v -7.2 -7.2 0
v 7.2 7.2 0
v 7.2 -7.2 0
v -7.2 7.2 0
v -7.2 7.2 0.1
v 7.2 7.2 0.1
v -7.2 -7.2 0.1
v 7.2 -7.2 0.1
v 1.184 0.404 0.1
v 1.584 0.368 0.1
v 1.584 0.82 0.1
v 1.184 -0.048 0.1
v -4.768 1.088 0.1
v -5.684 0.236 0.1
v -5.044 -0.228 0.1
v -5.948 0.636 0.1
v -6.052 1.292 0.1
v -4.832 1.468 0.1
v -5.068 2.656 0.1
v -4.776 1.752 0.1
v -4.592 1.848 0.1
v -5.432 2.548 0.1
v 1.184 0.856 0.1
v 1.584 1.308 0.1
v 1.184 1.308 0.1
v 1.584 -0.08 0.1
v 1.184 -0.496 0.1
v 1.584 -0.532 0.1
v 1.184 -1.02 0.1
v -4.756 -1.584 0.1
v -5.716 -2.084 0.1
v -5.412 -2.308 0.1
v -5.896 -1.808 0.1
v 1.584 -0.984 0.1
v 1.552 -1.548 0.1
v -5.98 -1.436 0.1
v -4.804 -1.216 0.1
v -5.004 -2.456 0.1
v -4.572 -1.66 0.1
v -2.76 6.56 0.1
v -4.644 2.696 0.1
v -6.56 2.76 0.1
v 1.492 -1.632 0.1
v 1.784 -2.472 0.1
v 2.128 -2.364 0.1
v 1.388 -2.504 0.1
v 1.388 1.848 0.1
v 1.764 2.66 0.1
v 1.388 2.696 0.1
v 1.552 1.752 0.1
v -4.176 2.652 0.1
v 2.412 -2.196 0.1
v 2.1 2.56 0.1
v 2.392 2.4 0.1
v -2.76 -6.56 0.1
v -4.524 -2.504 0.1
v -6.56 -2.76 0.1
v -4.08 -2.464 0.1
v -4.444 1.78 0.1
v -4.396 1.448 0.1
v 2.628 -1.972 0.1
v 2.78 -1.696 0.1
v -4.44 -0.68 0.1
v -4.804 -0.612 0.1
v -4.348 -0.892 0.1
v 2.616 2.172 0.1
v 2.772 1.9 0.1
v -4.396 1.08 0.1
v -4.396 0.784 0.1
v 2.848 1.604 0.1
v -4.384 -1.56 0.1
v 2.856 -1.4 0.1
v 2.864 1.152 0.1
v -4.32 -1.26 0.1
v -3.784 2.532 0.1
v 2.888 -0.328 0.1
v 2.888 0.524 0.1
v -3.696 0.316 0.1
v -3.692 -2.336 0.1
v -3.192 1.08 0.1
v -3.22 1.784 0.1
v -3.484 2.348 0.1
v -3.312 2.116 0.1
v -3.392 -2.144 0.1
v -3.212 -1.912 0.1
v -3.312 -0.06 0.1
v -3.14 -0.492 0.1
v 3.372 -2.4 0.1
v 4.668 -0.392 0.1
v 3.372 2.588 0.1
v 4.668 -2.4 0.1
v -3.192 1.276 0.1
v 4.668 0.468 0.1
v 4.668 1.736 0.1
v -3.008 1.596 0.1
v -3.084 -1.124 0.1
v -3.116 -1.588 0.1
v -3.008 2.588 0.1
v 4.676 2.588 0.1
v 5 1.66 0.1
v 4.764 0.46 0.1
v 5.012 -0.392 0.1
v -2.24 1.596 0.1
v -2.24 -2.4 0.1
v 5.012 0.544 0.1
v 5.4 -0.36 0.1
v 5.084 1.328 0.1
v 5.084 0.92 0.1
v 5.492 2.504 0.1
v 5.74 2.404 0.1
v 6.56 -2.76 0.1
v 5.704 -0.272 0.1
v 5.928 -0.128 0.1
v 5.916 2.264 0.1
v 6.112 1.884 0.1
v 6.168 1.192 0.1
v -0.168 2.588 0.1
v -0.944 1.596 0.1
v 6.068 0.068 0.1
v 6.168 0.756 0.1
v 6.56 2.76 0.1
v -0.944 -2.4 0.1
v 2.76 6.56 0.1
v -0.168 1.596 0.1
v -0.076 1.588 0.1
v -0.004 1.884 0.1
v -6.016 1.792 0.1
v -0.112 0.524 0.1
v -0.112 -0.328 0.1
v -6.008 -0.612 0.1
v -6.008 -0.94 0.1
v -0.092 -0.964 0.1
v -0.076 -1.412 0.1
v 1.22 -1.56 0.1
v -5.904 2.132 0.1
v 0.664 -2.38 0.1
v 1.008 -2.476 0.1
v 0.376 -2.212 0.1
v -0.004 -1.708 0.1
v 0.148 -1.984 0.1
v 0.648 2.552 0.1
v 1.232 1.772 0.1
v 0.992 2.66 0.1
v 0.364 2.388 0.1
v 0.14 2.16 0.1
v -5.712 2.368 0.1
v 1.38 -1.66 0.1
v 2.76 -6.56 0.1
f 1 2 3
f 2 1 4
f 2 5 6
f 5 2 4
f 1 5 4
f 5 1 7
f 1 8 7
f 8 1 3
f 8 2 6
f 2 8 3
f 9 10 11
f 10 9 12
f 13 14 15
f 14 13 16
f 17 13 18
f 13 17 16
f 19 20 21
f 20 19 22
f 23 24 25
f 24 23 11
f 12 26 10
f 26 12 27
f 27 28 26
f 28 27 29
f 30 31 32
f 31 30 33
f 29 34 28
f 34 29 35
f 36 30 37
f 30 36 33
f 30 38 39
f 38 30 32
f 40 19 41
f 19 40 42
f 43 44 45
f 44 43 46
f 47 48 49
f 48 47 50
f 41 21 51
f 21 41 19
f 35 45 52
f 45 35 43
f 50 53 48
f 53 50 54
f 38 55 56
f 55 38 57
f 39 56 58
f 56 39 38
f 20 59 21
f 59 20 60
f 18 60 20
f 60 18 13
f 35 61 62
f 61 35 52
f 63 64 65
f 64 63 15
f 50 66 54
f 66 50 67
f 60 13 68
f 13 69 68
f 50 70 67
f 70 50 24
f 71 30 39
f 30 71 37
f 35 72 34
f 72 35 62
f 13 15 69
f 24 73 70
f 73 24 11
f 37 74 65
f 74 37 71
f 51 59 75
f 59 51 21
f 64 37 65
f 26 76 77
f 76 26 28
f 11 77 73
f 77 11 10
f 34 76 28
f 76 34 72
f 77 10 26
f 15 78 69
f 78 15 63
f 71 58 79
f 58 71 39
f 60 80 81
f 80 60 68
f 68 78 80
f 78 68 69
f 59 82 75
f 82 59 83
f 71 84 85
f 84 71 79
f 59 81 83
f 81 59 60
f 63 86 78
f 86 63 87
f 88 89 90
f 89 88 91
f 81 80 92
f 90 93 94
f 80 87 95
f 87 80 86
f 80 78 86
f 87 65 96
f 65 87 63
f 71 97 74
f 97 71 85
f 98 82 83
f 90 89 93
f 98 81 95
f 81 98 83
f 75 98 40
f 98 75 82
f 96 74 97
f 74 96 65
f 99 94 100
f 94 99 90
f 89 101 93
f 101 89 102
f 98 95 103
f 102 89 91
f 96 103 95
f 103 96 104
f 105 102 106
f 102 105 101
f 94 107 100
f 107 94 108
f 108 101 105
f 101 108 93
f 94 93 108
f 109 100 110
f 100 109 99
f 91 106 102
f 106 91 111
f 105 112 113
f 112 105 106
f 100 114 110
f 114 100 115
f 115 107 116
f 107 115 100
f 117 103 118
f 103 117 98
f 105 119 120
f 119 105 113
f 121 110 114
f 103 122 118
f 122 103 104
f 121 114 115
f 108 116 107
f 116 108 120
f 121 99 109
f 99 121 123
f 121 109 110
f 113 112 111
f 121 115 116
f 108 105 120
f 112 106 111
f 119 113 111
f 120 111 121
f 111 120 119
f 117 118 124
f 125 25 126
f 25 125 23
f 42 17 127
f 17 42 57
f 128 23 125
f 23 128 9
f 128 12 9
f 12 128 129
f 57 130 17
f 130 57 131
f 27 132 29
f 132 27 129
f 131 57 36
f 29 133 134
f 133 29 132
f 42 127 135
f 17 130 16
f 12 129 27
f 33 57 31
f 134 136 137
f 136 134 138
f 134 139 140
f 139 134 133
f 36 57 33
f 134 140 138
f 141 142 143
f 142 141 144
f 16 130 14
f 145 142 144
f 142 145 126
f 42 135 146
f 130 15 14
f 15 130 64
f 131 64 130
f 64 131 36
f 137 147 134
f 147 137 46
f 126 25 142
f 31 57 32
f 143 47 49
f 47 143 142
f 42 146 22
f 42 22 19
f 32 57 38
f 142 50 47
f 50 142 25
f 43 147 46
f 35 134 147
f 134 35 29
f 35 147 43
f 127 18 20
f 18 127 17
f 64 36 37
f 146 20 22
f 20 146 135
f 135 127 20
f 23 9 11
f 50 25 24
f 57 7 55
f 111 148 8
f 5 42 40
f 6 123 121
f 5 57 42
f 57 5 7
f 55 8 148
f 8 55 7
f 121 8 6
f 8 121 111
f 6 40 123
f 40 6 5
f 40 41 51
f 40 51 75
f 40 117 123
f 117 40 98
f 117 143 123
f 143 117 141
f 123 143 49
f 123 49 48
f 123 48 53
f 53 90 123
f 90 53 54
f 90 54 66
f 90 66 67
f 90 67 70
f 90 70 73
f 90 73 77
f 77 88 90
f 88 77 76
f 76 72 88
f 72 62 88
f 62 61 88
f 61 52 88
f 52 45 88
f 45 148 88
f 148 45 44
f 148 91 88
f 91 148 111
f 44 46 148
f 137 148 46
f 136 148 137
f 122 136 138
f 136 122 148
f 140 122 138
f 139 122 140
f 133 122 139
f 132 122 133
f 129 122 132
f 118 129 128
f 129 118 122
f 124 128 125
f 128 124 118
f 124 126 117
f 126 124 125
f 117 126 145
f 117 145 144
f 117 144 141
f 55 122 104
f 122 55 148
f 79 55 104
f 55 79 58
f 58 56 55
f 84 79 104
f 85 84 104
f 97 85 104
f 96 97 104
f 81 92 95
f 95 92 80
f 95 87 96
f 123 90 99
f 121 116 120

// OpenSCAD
// file: ../p/box5-12.scad
use <../lib.scad>
function ldraw_lib__box5_12() = [
// 0 Box with 5 Faces without Any Edges
// 0 Name: box5-12.dat
// 0 Author: Chris Dee [cwdee]
// 0 !LDRAW_ORG Primitive UPDATE 2009-02
// 0 !LICENSE Licensed under CC BY 4.0 : see CAreadme.txt
// 
// 0 BFC CERTIFY CCW
  [0,"BFC","CERTIFY"],
  [0,"BFC","CCW"],
// 
// 0 !HISTORY 2009-09-03 [PTadmin] Official Update 2009-02
// 
// 
// 4 16 1 1 1 1 1 -1 -1 1 -1 -1 1 1
  [4,16,1,1,1,1,1,-1,-1,1,-1,-1,1,1],
// 4 16 -1 0 1 1 0 1 1 1 1 -1 1 1
  [4,16,-1,0,1,1,0,1,1,1,1,-1,1,1],
// 4 16 -1 0 -1 -1 0 1 -1 1 1 -1 1 -1
  [4,16,-1,0,-1,-1,0,1,-1,1,1,-1,1,-1],
// 4 16 1 0 -1 -1 0 -1 -1 1 -1 1 1 -1
  [4,16,1,0,-1,-1,0,-1,-1,1,-1,1,1,-1],
// 4 16 1 0 1 1 0 -1 1 1 -1 1 1 1
  [4,16,1,0,1,1,0,-1,1,1,-1,1,1,1],
// 0
];
module ldraw_lib__box5_12(step=0, col=false, unit=2/5, alt=false, line=0.2, solid=!$preview)
    makepoly(ldraw_lib__box5_12(), step=step, col=col, unit=unit, alt=alt, line=line, solid=solid);
ldraw_lib__box5_12(line=0.2);
// main file
use <../lib.scad>
use <../p/box5-12.scad>
function ldraw_lib__4222889c() = [
// 0 Sticker  1.8 x  1.8 with Black "STOP" in Black Octagon
// 0 Name: 4222889c.dat
// 0 Author: Gerald Lasser [GeraldLasser]
// 0 !LDRAW_ORG Part UPDATE 2024-04
// 0 !LICENSE Licensed under CC BY 4.0 : see CAreadme.txt
// 
// 0 BFC CERTIFY CCW
  [0,"BFC","CERTIFY"],
  [0,"BFC","CCW"],
// 
// 0 !KEYWORDS Bricklink 4855stk01, Set 4855
// 
// 0 !HISTORY 2024-05-28 [OrionP] Official Update 2024-04
// 
// 
// 1 16 0 -.25 0 18 0 0 0 .25 0 0 0 18 box5-12.dat
  [1,16,0,-.25,0,18,0,0,0,.25,0,0,0,18, ldraw_lib__box5_12()],
// 
// 0 // Font: Impact
// 4 16 2.96 -.25 1.01 2.96 -.25 -.12 3.96 -.25 .92 3.96 -.25 2.05
  [4,16,2.96,-.25,1.01,2.96,-.25,-.12,3.96,-.25,.92,3.96,-.25,2.05],
// 4 0 -14.21 -.25 .59 -12.61 -.25 -.57 -11.92 -.25 2.72 -14.87 -.25 1.59
  [4,0,-14.21,-.25,.59,-12.61,-.25,-.57,-11.92,-.25,2.72,-14.87,-.25,1.59],
// 4 0 -15.13 -.25 3.23 -14.87 -.25 1.59 -11.92 -.25 2.72 -12.08 -.25 3.67
  [4,0,-15.13,-.25,3.23,-14.87,-.25,1.59,-11.92,-.25,2.72,-12.08,-.25,3.67],
// 4 0 -12.67 -.25 6.64 -13.58 -.25 6.37 -11.94 -.25 4.38 -11.48 -.25 4.62
  [4,0,-12.67,-.25,6.64,-13.58,-.25,6.37,-11.94,-.25,4.38,-11.48,-.25,4.62],
// 4 16 2.96 -.25 2.14 3.96 -.25 2.05 3.96 -.25 3.27 2.96 -.25 3.27
  [4,16,2.96,-.25,2.14,3.96,-.25,2.05,3.96,-.25,3.27,2.96,-.25,3.27],
// 4 16 3.96 -.25 -.2 3.96 -.25 .92 2.96 -.25 -.12 2.96 -.25 -1.24
  [4,16,3.96,-.25,-.2,3.96,-.25,.92,2.96,-.25,-.12,2.96,-.25,-1.24],
// 4 16 2.96 -.25 -1.24 2.96 -.25 -2.55 3.96 -.25 -1.33 3.96 -.25 -.2
  [4,16,2.96,-.25,-1.24,2.96,-.25,-2.55,3.96,-.25,-1.33,3.96,-.25,-.2],
// 4 0 -14.29 -.25 -5.21 -13.53 -.25 -5.77 -11.89 -.25 -3.96 -14.74 -.25 -4.52
  [4,0,-14.29,-.25,-5.21,-13.53,-.25,-5.77,-11.89,-.25,-3.96,-14.74,-.25,-4.52],
// 4 16 2.96 -.25 -2.55 3.88 -.25 -3.87 3.96 -.25 -2.46 3.96 -.25 -1.33
  [4,16,2.96,-.25,-2.55,3.88,-.25,-3.87,3.96,-.25,-2.46,3.96,-.25,-1.33],
// 4 0 -11.89 -.25 -3.96 -12.01 -.25 -3.04 -14.95 -.25 -3.59 -14.74 -.25 -4.52
  [4,0,-11.89,-.25,-3.96,-12.01,-.25,-3.04,-14.95,-.25,-3.59,-14.74,-.25,-4.52],
// 4 0 -11.89 -.25 -3.96 -13.53 -.25 -5.77 -12.51 -.25 -6.14 -11.43 -.25 -4.15
  [4,0,-11.89,-.25,-3.96,-13.53,-.25,-5.77,-12.51,-.25,-6.14,-11.43,-.25,-4.15],
// 4 16 -16.4 -.25 6.9 -12.67 -.25 6.64 -11.61 -.25 6.74 -6.9 -.25 16.4
  [4,16,-16.4,-.25,6.9,-12.67,-.25,6.64,-11.61,-.25,6.74,-6.9,-.25,16.4],
// 4 0 3.73 -.25 -4.08 3.47 -.25 -6.26 4.46 -.25 -6.18 5.32 -.25 -5.91
  [4,0,3.73,-.25,-4.08,3.47,-.25,-6.26,4.46,-.25,-6.18,5.32,-.25,-5.91],
// 4 0 4.41 -.25 6.65 3.47 -.25 6.74 3.47 -.25 4.62 3.88 -.25 4.38
  [4,0,4.41,-.25,6.65,3.47,-.25,6.74,3.47,-.25,4.62,3.88,-.25,4.38],
// 4 0 -11.61 -.25 6.74 -12.67 -.25 6.64 -11.48 -.25 4.62 -10.44 -.25 6.63
  [4,0,-11.61,-.25,6.74,-12.67,-.25,6.64,-11.48,-.25,4.62,-10.44,-.25,6.63],
// 4 0 3.88 -.25 -3.87 3.73 -.25 -4.08 5.32 -.25 -5.91 6.03 -.25 -5.49
  [4,0,3.88,-.25,-3.87,3.73,-.25,-4.08,5.32,-.25,-5.91,6.03,-.25,-5.49],
// 4 0 5.25 -.25 6.4 4.41 -.25 6.65 3.88 -.25 4.38 5.98 -.25 6
  [4,0,5.25,-.25,6.4,4.41,-.25,6.65,3.88,-.25,4.38,5.98,-.25,6],
// 4 16 -11.31 -.25 -6.26 -12.51 -.25 -6.14 -16.4 -.25 -6.9 -6.9 -.25 -16.4
  [4,16,-11.31,-.25,-6.26,-12.51,-.25,-6.14,-16.4,-.25,-6.9,-6.9,-.25,-16.4],
// 4 0 -11.43 -.25 -4.15 -12.51 -.25 -6.14 -11.31 -.25 -6.26 -10.2 -.25 -6.16
  [4,0,-11.43,-.25,-4.15,-12.51,-.25,-6.14,-11.31,-.25,-6.26,-10.2,-.25,-6.16],
// 4 16 -11.11 -.25 4.45 -11.48 -.25 4.62 -11.94 -.25 4.38 -10.99 -.25 3.62
  [4,16,-11.11,-.25,4.45,-11.48,-.25,4.62,-11.94,-.25,4.38,-10.99,-.25,3.62],
// 4 16 -12.08 -.25 3.67 -11.92 -.25 2.72 -10.99 -.25 3.62 -11.94 -.25 4.38
  [4,16,-12.08,-.25,3.67,-11.92,-.25,2.72,-10.99,-.25,3.62,-11.94,-.25,4.38],
// 4 0 3.88 -.25 -3.87 6.03 -.25 -5.49 6.57 -.25 -4.93 6.95 -.25 -4.24
  [4,0,3.88,-.25,-3.87,6.03,-.25,-5.49,6.57,-.25,-4.93,6.95,-.25,-4.24],
// 4 16 -11.1 -.25 -1.7 -12.61 -.25 -.57 -12.01 -.25 -1.53 -10.87 -.25 -2.23
  [4,16,-11.1,-.25,-1.7,-12.61,-.25,-.57,-12.01,-.25,-1.53,-10.87,-.25,-2.23],
// 4 0 6.54 -.25 5.43 5.98 -.25 6 3.88 -.25 4.38 6.93 -.25 4.75
  [4,0,6.54,-.25,5.43,5.98,-.25,6,3.88,-.25,4.38,6.93,-.25,4.75],
// 3 16 -10.99 -.25 3.62 -11.92 -.25 2.72 -10.99 -.25 2.7
  [3,16,-10.99,-.25,3.62,-11.92,-.25,2.72,-10.99,-.25,2.7],
// 3 16 -11.92 -.25 2.72 -10.99 -.25 1.96 -10.99 -.25 2.7
  [3,16,-11.92,-.25,2.72,-10.99,-.25,1.96,-10.99,-.25,2.7],
// 4 0 7.12 -.25 4.01 6.93 -.25 4.75 3.88 -.25 4.38 3.96 -.25 3.27
  [4,0,7.12,-.25,4.01,6.93,-.25,4.75,3.88,-.25,4.38,3.96,-.25,3.27],
// 4 16 -10.96 -.25 -3.9 -12.01 -.25 -3.04 -11.89 -.25 -3.96 -11.43 -.25 -4.15
  [4,16,-10.96,-.25,-3.9,-12.01,-.25,-3.04,-11.89,-.25,-3.96,-11.43,-.25,-4.15],
// 4 0 3.88 -.25 -3.87 6.95 -.25 -4.24 7.14 -.25 -3.5 3.96 -.25 -2.46
  [4,0,3.88,-.25,-3.87,6.95,-.25,-4.24,7.14,-.25,-3.5,3.96,-.25,-2.46],
// 3 0 -11.92 -.25 2.72 -12.61 -.25 -.57 -10.99 -.25 1.96
  [3,0,-11.92,-.25,2.72,-12.61,-.25,-.57,-10.99,-.25,1.96],
// 4 0 3.96 -.25 3.27 3.96 -.25 2.05 7.16 -.25 2.88 7.12 -.25 4.01
  [4,0,3.96,-.25,3.27,3.96,-.25,2.05,7.16,-.25,2.88,7.12,-.25,4.01],
// 4 16 -10.8 -.25 -3.15 -10.87 -.25 -2.23 -12.01 -.25 -3.04 -10.96 -.25 -3.9
  [4,16,-10.8,-.25,-3.15,-10.87,-.25,-2.23,-12.01,-.25,-3.04,-10.96,-.25,-3.9],
// 4 0 -10.44 -.25 6.63 -11.48 -.25 4.62 -11.11 -.25 4.45 -9.46 -.25 6.33
  [4,0,-10.44,-.25,6.63,-11.48,-.25,4.62,-11.11,-.25,4.45,-9.46,-.25,6.33],
// 3 16 -12.01 -.25 -1.53 -12.01 -.25 -3.04 -10.87 -.25 -2.23
  [3,16,-12.01,-.25,-1.53,-12.01,-.25,-3.04,-10.87,-.25,-2.23],
// 4 0 3.96 -.25 -.2 3.96 -.25 -1.33 7.22 -.25 -.82 7.22 -.25 1.31
  [4,0,3.96,-.25,-.2,3.96,-.25,-1.33,7.22,-.25,-.82,7.22,-.25,1.31],
// 4 0 7.22 -.25 1.31 7.16 -.25 2.88 3.96 -.25 2.05 3.96 -.25 .92
  [4,0,7.22,-.25,1.31,7.16,-.25,2.88,3.96,-.25,2.05,3.96,-.25,.92],
// 4 0 7.22 -.25 -.82 3.96 -.25 -1.33 3.96 -.25 -2.46 7.14 -.25 -3.5
  [4,0,7.22,-.25,-.82,3.96,-.25,-1.33,3.96,-.25,-2.46,7.14,-.25,-3.5],
// 3 0 7.22 -.25 1.31 3.96 -.25 .92 3.96 -.25 -.2
  [3,0,7.22,-.25,1.31,3.96,-.25,.92,3.96,-.25,-.2],
// 4 0 -9.24 -.25 .79 -10.99 -.25 1.96 -12.61 -.25 -.57 -11.1 -.25 -1.7
  [4,0,-9.24,-.25,.79,-10.99,-.25,1.96,-12.61,-.25,-.57,-11.1,-.25,-1.7],
// 4 0 -10.96 -.25 -3.9 -11.43 -.25 -4.15 -10.2 -.25 -6.16 -9.23 -.25 -5.84
  [4,0,-10.96,-.25,-3.9,-11.43,-.25,-4.15,-10.2,-.25,-6.16,-9.23,-.25,-5.84],
// 4 0 -10.99 -.25 3.62 -10.99 -.25 2.7 -7.98 -.25 2.7 -8.05 -.25 4.46
  [4,0,-10.99,-.25,3.62,-10.99,-.25,2.7,-7.98,-.25,2.7,-8.05,-.25,4.46],
// 4 16 -10.99 -.25 1.96 -9.24 -.25 .79 -7.98 -.25 2.7 -10.99 -.25 2.7
  [4,16,-10.99,-.25,1.96,-9.24,-.25,.79,-7.98,-.25,2.7,-10.99,-.25,2.7],
// 4 0 -8.71 -.25 5.87 -9.46 -.25 6.33 -11.11 -.25 4.45 -8.28 -.25 5.29
  [4,0,-8.71,-.25,5.87,-9.46,-.25,6.33,-11.11,-.25,4.45,-8.28,-.25,5.29],
// 4 0 -10.96 -.25 -3.9 -9.23 -.25 -5.84 -8.48 -.25 -5.36 -8.03 -.25 -4.78
  [4,0,-10.96,-.25,-3.9,-9.23,-.25,-5.84,-8.48,-.25,-5.36,-8.03,-.25,-4.78],
// 4 0 -8.05 -.25 4.46 -8.28 -.25 5.29 -11.11 -.25 4.45 -10.99 -.25 3.62
  [4,0,-8.05,-.25,4.46,-8.28,-.25,5.29,-11.11,-.25,4.45,-10.99,-.25,3.62],
// 4 0 -8.28 -.25 -.15 -9.24 -.25 .79 -11.1 -.25 -1.7 -7.85 -.25 -1.23
  [4,0,-8.28,-.25,-.15,-9.24,-.25,.79,-11.1,-.25,-1.7,-7.85,-.25,-1.23],
// 4 0 8.43 -.25 6.47 8.43 -.25 -6 11.67 -.25 -6 11.67 -.25 -.98
  [4,0,8.43,-.25,6.47,8.43,-.25,-6,11.67,-.25,-6,11.67,-.25,-.98],
// 3 0 -8.05 -.25 4.46 -7.98 -.25 2.7 -7.98 -.25 3.19
  [3,0,-8.05,-.25,4.46,-7.98,-.25,2.7,-7.98,-.25,3.19],
// 3 0 8.43 -.25 6.47 11.67 -.25 1.17 11.67 -.25 4.34
  [3,0,8.43,-.25,6.47,11.67,-.25,1.17,11.67,-.25,4.34],
// 4 16 -7.98 -.25 2.7 -8.28 -.25 -.15 -7.85 -.25 -1.23 -7.52 -.25 3.99
  [4,16,-7.98,-.25,2.7,-8.28,-.25,-.15,-7.85,-.25,-1.23,-7.52,-.25,3.99],
// 3 16 -7.98 -.25 2.7 -9.24 -.25 .79 -8.28 -.25 -.15
  [3,16,-7.98,-.25,2.7,-9.24,-.25,.79,-8.28,-.25,-.15],
// 4 0 -7.85 -.25 -1.23 -11.1 -.25 -1.7 -10.87 -.25 -2.23 -7.71 -.25 -2.81
  [4,0,-7.85,-.25,-1.23,-11.1,-.25,-1.7,-10.87,-.25,-2.23,-7.71,-.25,-2.81],
// 4 0 -7.79 -.25 -3.97 -10.8 -.25 -3.15 -10.96 -.25 -3.9 -8.03 -.25 -4.78
  [4,0,-7.79,-.25,-3.97,-10.8,-.25,-3.15,-10.96,-.25,-3.9,-8.03,-.25,-4.78],
// 3 16 -7.52 -.25 6.47 -8.71 -.25 5.87 -8.28 -.25 5.29
  [3,16,-7.52,-.25,6.47,-8.71,-.25,5.87,-8.28,-.25,5.29],
// 3 0 8.43 -.25 6.47 11.67 -.25 -.98 11.67 -.25 1.17
  [3,0,8.43,-.25,6.47,11.67,-.25,-.98,11.67,-.25,1.17],
// 4 16 -7.52 -.25 6.47 -8.28 -.25 5.29 -8.05 -.25 4.46 -7.52 -.25 3.99
  [4,16,-7.52,-.25,6.47,-8.28,-.25,5.29,-8.05,-.25,4.46,-7.52,-.25,3.99],
// 4 16 -9.46 -.25 6.33 -8.71 -.25 5.87 -7.52 -.25 6.47 -6.9 -.25 16.4
  [4,16,-9.46,-.25,6.33,-8.71,-.25,5.87,-7.52,-.25,6.47,-6.9,-.25,16.4],
// 4 0 -10.8 -.25 -3.15 -7.79 -.25 -3.97 -7.71 -.25 -2.81 -10.87 -.25 -2.23
  [4,0,-10.8,-.25,-3.15,-7.79,-.25,-3.97,-7.71,-.25,-2.81,-10.87,-.25,-2.23],
// 4 0 11.69 -.25 6.47 8.43 -.25 6.47 11.67 -.25 4.34 12.5 -.25 4.15
  [4,0,11.69,-.25,6.47,8.43,-.25,6.47,11.67,-.25,4.34,12.5,-.25,4.15],
// 4 0 11.91 -.25 1.15 11.67 -.25 1.17 11.67 -.25 -.98 12.53 -.25 -.98
  [4,0,11.91,-.25,1.15,11.67,-.25,1.17,11.67,-.25,-.98,12.53,-.25,-.98],
// 3 0 -7.52 -.25 6.47 -7.52 -.25 3.99 -5.6 -.25 3.99
  [3,0,-7.52,-.25,6.47,-7.52,-.25,3.99,-5.6,-.25,3.99],
// 3 16 12.53 -.25 -.98 11.67 -.25 -.98 11.67 -.25 -6
  [3,16,12.53,-.25,-.98,11.67,-.25,-.98,11.67,-.25,-6],
// 4 16 -5.6 -.25 -6 -5.6 -.25 3.99 -7.52 -.25 3.99 -7.71 -.25 -2.81
  [4,16,-5.6,-.25,-6,-5.6,-.25,3.99,-7.52,-.25,3.99,-7.71,-.25,-2.81],
// 4 0 12.53 -.25 1.36 11.91 -.25 1.15 12.53 -.25 -.98 13.5 -.25 -.9
  [4,0,12.53,-.25,1.36,11.91,-.25,1.15,12.53,-.25,-.98,13.5,-.25,-.9],
// 4 16 12.71 -.25 3.32 12.5 -.25 4.15 11.67 -.25 4.34 12.71 -.25 2.3
  [4,16,12.71,-.25,3.32,12.5,-.25,4.15,11.67,-.25,4.34,12.71,-.25,2.3],
// 4 16 11.91 -.25 1.15 12.53 -.25 1.36 12.71 -.25 2.3 11.67 -.25 1.17
  [4,16,11.91,-.25,1.15,12.53,-.25,1.36,12.71,-.25,2.3,11.67,-.25,1.17],
// 3 16 11.67 -.25 4.34 11.67 -.25 1.17 12.71 -.25 2.3
  [3,16,11.67,-.25,4.34,11.67,-.25,1.17,12.71,-.25,2.3],
// 4 0 13.73 -.25 6.26 11.69 -.25 6.47 12.5 -.25 4.15 14.35 -.25 6.01
  [4,0,13.73,-.25,6.26,11.69,-.25,6.47,12.5,-.25,4.15,14.35,-.25,6.01],
// 4 16 13.5 -.25 -.9 12.53 -.25 -.98 11.67 -.25 -6 16.4 -.25 -6.9
  [4,16,13.5,-.25,-.9,12.53,-.25,-.98,11.67,-.25,-6,16.4,-.25,-6.9],
// 4 0 12.53 -.25 1.36 13.5 -.25 -.9 14.26 -.25 -.68 14.82 -.25 -.32
  [4,0,12.53,-.25,1.36,13.5,-.25,-.9,14.26,-.25,-.68,14.82,-.25,-.32],
// 4 0 14.79 -.25 5.66 14.35 -.25 6.01 12.5 -.25 4.15 15.28 -.25 4.71
  [4,0,14.79,-.25,5.66,14.35,-.25,6.01,12.5,-.25,4.15,15.28,-.25,4.71],
// 4 0 15.28 -.25 4.71 12.5 -.25 4.15 12.71 -.25 3.32 15.42 -.25 2.98
  [4,0,15.28,-.25,4.71,12.5,-.25,4.15,12.71,-.25,3.32,15.42,-.25,2.98],
// 4 0 -7.52 -.25 6.47 -5.6 -.25 3.99 -2.36 -.25 3.99 -.42 -.25 6.47
  [4,0,-7.52,-.25,6.47,-5.6,-.25,3.99,-2.36,-.25,3.99,-.42,-.25,6.47],
// 4 0 12.53 -.25 1.36 14.82 -.25 -.32 15.17 -.25 .17 15.42 -.25 1.89
  [4,0,12.53,-.25,1.36,14.82,-.25,-.32,15.17,-.25,.17,15.42,-.25,1.89],
// 3 16 16.4 -.25 6.9 14.35 -.25 6.01 14.79 -.25 5.66
  [3,16,16.4,-.25,6.9,14.35,-.25,6.01,14.79,-.25,5.66],
// 4 0 -2.36 -.25 -6 -2.36 -.25 3.99 -5.6 -.25 3.99 -5.6 -.25 -6
  [4,0,-2.36,-.25,-6,-2.36,-.25,3.99,-5.6,-.25,3.99,-5.6,-.25,-6],
// 3 16 16.4 -.25 6.9 14.79 -.25 5.66 15.28 -.25 4.71
  [3,16,16.4,-.25,6.9,14.79,-.25,5.66,15.28,-.25,4.71],
// 4 0 15.42 -.25 2.98 12.71 -.25 3.32 12.71 -.25 2.3 15.42 -.25 1.89
  [4,0,15.42,-.25,2.98,12.71,-.25,3.32,12.71,-.25,2.3,15.42,-.25,1.89],
// 4 16 11.69 -.25 6.47 13.73 -.25 6.26 16.4 -.25 6.9 6.9 -.25 16.4
  [4,16,11.69,-.25,6.47,13.73,-.25,6.26,16.4,-.25,6.9,6.9,-.25,16.4],
// 3 16 16.4 -.25 6.9 13.73 -.25 6.26 14.35 -.25 6.01
  [3,16,16.4,-.25,6.9,13.73,-.25,6.26,14.35,-.25,6.01],
// 3 16 14.82 -.25 -.32 14.26 -.25 -.68 16.4 -.25 -6.9
  [3,16,14.82,-.25,-.32,14.26,-.25,-.68,16.4,-.25,-6.9],
// 3 16 16.4 -.25 6.9 15.28 -.25 4.71 15.42 -.25 2.98
  [3,16,16.4,-.25,6.9,15.28,-.25,4.71,15.42,-.25,2.98],
// 3 0 12.71 -.25 2.3 12.53 -.25 1.36 15.42 -.25 1.89
  [3,0,12.71,-.25,2.3,12.53,-.25,1.36,15.42,-.25,1.89],
// 3 16 14.26 -.25 -.68 13.5 -.25 -.9 16.4 -.25 -6.9
  [3,16,14.26,-.25,-.68,13.5,-.25,-.9,16.4,-.25,-6.9],
// 3 16 15.17 -.25 .17 14.82 -.25 -.32 16.4 -.25 -6.9
  [3,16,15.17,-.25,.17,14.82,-.25,-.32,16.4,-.25,-6.9],
// 4 16 15.42 -.25 1.89 15.17 -.25 .17 16.4 -.25 -6.9 16.4 -.25 6.9
  [4,16,15.42,-.25,1.89,15.17,-.25,.17,16.4,-.25,-6.9,16.4,-.25,6.9],
// 3 0 -.42 -.25 6.47 -2.36 -.25 3.99 -.42 -.25 3.99
  [3,0,-.42,-.25,6.47,-2.36,-.25,3.99,-.42,-.25,3.99],
// 4 0 2.96 -.25 3.27 -.01 -.25 4.71 -.19 -.25 3.97 2.96 -.25 2.14
  [4,0,2.96,-.25,3.27,-.01,-.25,4.71,-.19,-.25,3.97,2.96,-.25,2.14],
// 4 16 -15.13 -.25 3.23 -15.04 -.25 4.48 -16.4 -.25 6.9 -16.4 -.25 -6.9
  [4,16,-15.13,-.25,3.23,-15.04,-.25,4.48,-16.4,-.25,6.9,-16.4,-.25,-6.9],
// 4 0 2.96 -.25 2.14 -.19 -.25 3.97 -.28 -.25 1.31 2.96 -.25 1.01
  [4,0,2.96,-.25,2.14,-.19,-.25,3.97,-.28,-.25,1.31,2.96,-.25,1.01],
// 4 0 -.28 -.25 1.31 -.28 -.25 -.82 2.96 -.25 -.12 2.96 -.25 1.01
  [4,0,-.28,-.25,1.31,-.28,-.25,-.82,2.96,-.25,-.12,2.96,-.25,1.01],
// 4 16 -15.02 -.25 -1.53 -15.13 -.25 3.23 -16.4 -.25 -6.9 -15.02 -.25 -2.35
  [4,16,-15.02,-.25,-1.53,-15.13,-.25,3.23,-16.4,-.25,-6.9,-15.02,-.25,-2.35],
// 4 0 2.96 -.25 -1.24 -.28 -.25 -.82 -.23 -.25 -2.41 2.96 -.25 -2.55
  [4,0,2.96,-.25,-1.24,-.28,-.25,-.82,-.23,-.25,-2.41,2.96,-.25,-2.55],
// 3 16 -15.02 -.25 -2.35 -16.4 -.25 -6.9 -14.95 -.25 -3.59
  [3,16,-15.02,-.25,-2.35,-16.4,-.25,-6.9,-14.95,-.25,-3.59],
// 4 0 2.96 -.25 -2.55 -.23 -.25 -2.41 -.19 -.25 -3.53 3.05 -.25 -3.9
  [4,0,2.96,-.25,-2.55,-.23,-.25,-2.41,-.19,-.25,-3.53,3.05,-.25,-3.9],
// 3 16 -16.4 -.25 6.9 -15.04 -.25 4.48 -14.76 -.25 5.33
  [3,16,-16.4,-.25,6.9,-15.04,-.25,4.48,-14.76,-.25,5.33],
// 3 16 -15.13 -.25 3.23 -15.02 -.25 -1.53 -14.87 -.25 1.59
  [3,16,-15.13,-.25,3.23,-15.02,-.25,-1.53,-14.87,-.25,1.59],
// 3 0 2.96 -.25 -.12 -.28 -.25 -.82 2.96 -.25 -1.24
  [3,0,2.96,-.25,-.12,-.28,-.25,-.82,2.96,-.25,-1.24],
// 3 16 -14.74 -.25 -4.52 -16.4 -.25 -6.9 -14.29 -.25 -5.21
  [3,16,-14.74,-.25,-4.52,-16.4,-.25,-6.9,-14.29,-.25,-5.21],
// 4 0 1.66 -.25 -5.95 2.52 -.25 -6.19 3.05 -.25 -3.9 .94 -.25 -5.53
  [4,0,1.66,-.25,-5.95,2.52,-.25,-6.19,3.05,-.25,-3.9,.94,-.25,-5.53],
// 4 0 -.01 -.25 -4.27 .37 -.25 -4.96 3.05 -.25 -3.9 -.19 -.25 -3.53
  [4,0,-.01,-.25,-4.27,.37,-.25,-4.96,3.05,-.25,-3.9,-.19,-.25,-3.53],
// 3 16 -14.95 -.25 -3.59 -16.4 -.25 -6.9 -14.74 -.25 -4.52
  [3,16,-14.95,-.25,-3.59,-16.4,-.25,-6.9,-14.74,-.25,-4.52],
// 3 0 3.05 -.25 -3.9 .37 -.25 -4.96 .94 -.25 -5.53
  [3,0,3.05,-.25,-3.9,.37,-.25,-4.96,.94,-.25,-5.53],
// 4 0 3.08 -.25 4.43 2.48 -.25 6.65 1.62 -.25 6.38 .91 -.25 5.97
  [4,0,3.08,-.25,4.43,2.48,-.25,6.65,1.62,-.25,6.38,.91,-.25,5.97],
// 3 16 -14.87 -.25 1.59 -15.02 -.25 -1.53 -14.21 -.25 .59
  [3,16,-14.87,-.25,1.59,-15.02,-.25,-1.53,-14.21,-.25,.59],
// 4 0 .35 -.25 5.4 -.01 -.25 4.71 3.08 -.25 4.43 .91 -.25 5.97
  [4,0,.35,-.25,5.4,-.01,-.25,4.71,3.08,-.25,4.43,.91,-.25,5.97],
// 3 16 -16.4 -.25 6.9 -14.76 -.25 5.33 -14.28 -.25 5.92
  [3,16,-16.4,-.25,6.9,-14.76,-.25,5.33,-14.28,-.25,5.92],
// 4 16 -14.21 -.25 .59 -15.02 -.25 -1.53 -12.01 -.25 -1.53 -12.61 -.25 -.57
  [4,16,-14.21,-.25,.59,-15.02,-.25,-1.53,-12.01,-.25,-1.53,-12.61,-.25,-.57],
// 4 0 -12.01 -.25 -1.53 -15.02 -.25 -1.53 -15.02 -.25 -2.35 -14.95 -.25 -3.59
  [4,0,-12.01,-.25,-1.53,-15.02,-.25,-1.53,-15.02,-.25,-2.35,-14.95,-.25,-3.59],
// 4 0 3.45 -.25 -4.15 3.05 -.25 -3.9 2.52 -.25 -6.19 3.47 -.25 -6.26
  [4,0,3.45,-.25,-4.15,3.05,-.25,-3.9,2.52,-.25,-6.19,3.47,-.25,-6.26],
// 3 0 -.01 -.25 4.71 2.96 -.25 3.27 3.08 -.25 4.43
  [3,0,-.01,-.25,4.71,2.96,-.25,3.27,3.08,-.25,4.43],
// 3 16 -14.29 -.25 -5.21 -16.4 -.25 -6.9 -13.53 -.25 -5.77
  [3,16,-14.29,-.25,-5.21,-16.4,-.25,-6.9,-13.53,-.25,-5.77],
// 4 0 2.48 -.25 6.65 3.08 -.25 4.43 3.47 -.25 4.62 3.47 -.25 6.74
  [4,0,2.48,-.25,6.65,3.08,-.25,4.43,3.47,-.25,4.62,3.47,-.25,6.74],
// 3 16 -16.4 -.25 6.9 -14.28 -.25 5.92 -13.58 -.25 6.37
  [3,16,-16.4,-.25,6.9,-14.28,-.25,5.92,-13.58,-.25,6.37],
// 3 16 -16.4 -.25 6.9 -13.58 -.25 6.37 -12.67 -.25 6.64
  [3,16,-16.4,-.25,6.9,-13.58,-.25,6.37,-12.67,-.25,6.64],
// 3 16 -13.53 -.25 -5.77 -16.4 -.25 -6.9 -12.51 -.25 -6.14
  [3,16,-13.53,-.25,-5.77,-16.4,-.25,-6.9,-12.51,-.25,-6.14],
// 4 16 3.88 -.25 4.38 3.47 -.25 4.62 3.08 -.25 4.43 2.96 -.25 3.27
  [4,16,3.88,-.25,4.38,3.47,-.25,4.62,3.08,-.25,4.43,2.96,-.25,3.27],
// 3 0 3.73 -.25 -4.08 3.45 -.25 -4.15 3.47 -.25 -6.26
  [3,0,3.73,-.25,-4.08,3.45,-.25,-4.15,3.47,-.25,-6.26],
// 4 16 3.88 -.25 -3.87 2.96 -.25 -2.55 3.05 -.25 -3.9 3.45 -.25 -4.15
  [4,16,3.88,-.25,-3.87,2.96,-.25,-2.55,3.05,-.25,-3.9,3.45,-.25,-4.15],
// 3 16 3.88 -.25 -3.87 3.45 -.25 -4.15 3.73 -.25 -4.08
  [3,16,3.88,-.25,-3.87,3.45,-.25,-4.15,3.73,-.25,-4.08],
// 4 0 -15.04 -.25 4.48 -15.13 -.25 3.23 -12.08 -.25 3.67 -11.94 -.25 4.38
  [4,0,-15.04,-.25,4.48,-15.13,-.25,3.23,-12.08,-.25,3.67,-11.94,-.25,4.38],
// 3 0 -12.01 -.25 -1.53 -14.95 -.25 -3.59 -12.01 -.25 -3.04
  [3,0,-12.01,-.25,-1.53,-14.95,-.25,-3.59,-12.01,-.25,-3.04],
// 4 0 -11.94 -.25 4.38 -13.58 -.25 6.37 -14.28 -.25 5.92 -14.76 -.25 5.33
  [4,0,-11.94,-.25,4.38,-13.58,-.25,6.37,-14.28,-.25,5.92,-14.76,-.25,5.33],
// 3 0 -14.76 -.25 5.33 -15.04 -.25 4.48 -11.94 -.25 4.38
  [3,0,-14.76,-.25,5.33,-15.04,-.25,4.48,-11.94,-.25,4.38],
// 3 16 2.96 -.25 2.14 2.96 -.25 1.01 3.96 -.25 2.05
  [3,16,2.96,-.25,2.14,2.96,-.25,1.01,3.96,-.25,2.05],
// 3 16 3.88 -.25 4.38 2.96 -.25 3.27 3.96 -.25 3.27
  [3,16,3.88,-.25,4.38,2.96,-.25,3.27,3.96,-.25,3.27],
// 3 0 -16.4 -.25 -6.9 -18 -.25 -18 -6.9 -.25 -16.4
  [3,0,-16.4,-.25,-6.9,-18,-.25,-18,-6.9,-.25,-16.4],
// 3 0 16.4 -.25 -6.9 6.9 -.25 -16.4 18 -.25 -18
  [3,0,16.4,-.25,-6.9,6.9,-.25,-16.4,18,-.25,-18],
// 3 0 -18 -.25 18 -16.4 -.25 6.9 -6.9 -.25 16.4
  [3,0,-18,-.25,18,-16.4,-.25,6.9,-6.9,-.25,16.4],
// 3 0 18 -.25 18 6.9 -.25 16.4 16.4 -.25 6.9
  [3,0,18,-.25,18,6.9,-.25,16.4,16.4,-.25,6.9],
// 4 0 -16.4 -.25 -6.9 -16.4 -.25 6.9 -18 -.25 18 -18 -.25 -18
  [4,0,-16.4,-.25,-6.9,-16.4,-.25,6.9,-18,-.25,18,-18,-.25,-18],
// 4 0 -6.9 -.25 -16.4 -18 -.25 -18 18 -.25 -18 6.9 -.25 -16.4
  [4,0,-6.9,-.25,-16.4,-18,-.25,-18,18,-.25,-18,6.9,-.25,-16.4],
// 4 0 16.4 -.25 6.9 16.4 -.25 -6.9 18 -.25 -18 18 -.25 18
  [4,0,16.4,-.25,6.9,16.4,-.25,-6.9,18,-.25,-18,18,-.25,18],
// 4 0 -18 -.25 18 -6.9 -.25 16.4 6.9 -.25 16.4 18 -.25 18
  [4,0,-18,-.25,18,-6.9,-.25,16.4,6.9,-.25,16.4,18,-.25,18],
// 3 16 -6.9 -.25 16.4 -11.61 -.25 6.74 -10.44 -.25 6.63
  [3,16,-6.9,-.25,16.4,-11.61,-.25,6.74,-10.44,-.25,6.63],
// 3 16 -6.9 -.25 16.4 -10.44 -.25 6.63 -9.46 -.25 6.33
  [3,16,-6.9,-.25,16.4,-10.44,-.25,6.63,-9.46,-.25,6.33],
// 4 16 -6.9 -.25 16.4 -7.52 -.25 6.47 -.42 -.25 6.47 6.9 -.25 16.4
  [4,16,-6.9,-.25,16.4,-7.52,-.25,6.47,-.42,-.25,6.47,6.9,-.25,16.4],
// 4 16 6.9 -.25 16.4 -.42 -.25 6.47 1.62 -.25 6.38 2.48 -.25 6.65
  [4,16,6.9,-.25,16.4,-.42,-.25,6.47,1.62,-.25,6.38,2.48,-.25,6.65],
// 3 16 6.9 -.25 16.4 2.48 -.25 6.65 3.47 -.25 6.74
  [3,16,6.9,-.25,16.4,2.48,-.25,6.65,3.47,-.25,6.74],
// 3 16 6.9 -.25 16.4 3.47 -.25 6.74 4.41 -.25 6.65
  [3,16,6.9,-.25,16.4,3.47,-.25,6.74,4.41,-.25,6.65],
// 3 16 6.9 -.25 16.4 4.41 -.25 6.65 5.25 -.25 6.4
  [3,16,6.9,-.25,16.4,4.41,-.25,6.65,5.25,-.25,6.4],
// 4 16 6.9 -.25 16.4 5.25 -.25 6.4 5.98 -.25 6 8.43 -.25 6.47
  [4,16,6.9,-.25,16.4,5.25,-.25,6.4,5.98,-.25,6,8.43,-.25,6.47],
// 3 16 8.43 -.25 6.47 5.98 -.25 6 6.54 -.25 5.43
  [3,16,8.43,-.25,6.47,5.98,-.25,6,6.54,-.25,5.43],
// 3 16 8.43 -.25 6.47 6.54 -.25 5.43 6.93 -.25 4.75
  [3,16,8.43,-.25,6.47,6.54,-.25,5.43,6.93,-.25,4.75],
// 3 16 8.43 -.25 6.47 6.93 -.25 4.75 7.12 -.25 4.01
  [3,16,8.43,-.25,6.47,6.93,-.25,4.75,7.12,-.25,4.01],
// 3 16 8.43 -.25 6.47 7.12 -.25 4.01 7.16 -.25 2.88
  [3,16,8.43,-.25,6.47,7.12,-.25,4.01,7.16,-.25,2.88],
// 3 16 8.43 -.25 6.47 7.16 -.25 2.88 7.22 -.25 1.31
  [3,16,8.43,-.25,6.47,7.16,-.25,2.88,7.22,-.25,1.31],
// 4 16 8.43 -.25 6.47 7.22 -.25 1.31 7.22 -.25 -.82 8.43 -.25 -6
  [4,16,8.43,-.25,6.47,7.22,-.25,1.31,7.22,-.25,-.82,8.43,-.25,-6],
// 3 16 7.22 -.25 -.82 7.14 -.25 -3.5 8.43 -.25 -6
  [3,16,7.22,-.25,-.82,7.14,-.25,-3.5,8.43,-.25,-6],
// 3 16 7.14 -.25 -3.5 6.95 -.25 -4.24 8.43 -.25 -6
  [3,16,7.14,-.25,-3.5,6.95,-.25,-4.24,8.43,-.25,-6],
// 3 16 6.95 -.25 -4.24 6.57 -.25 -4.93 8.43 -.25 -6
  [3,16,6.95,-.25,-4.24,6.57,-.25,-4.93,8.43,-.25,-6],
// 3 16 6.57 -.25 -4.93 6.03 -.25 -5.49 8.43 -.25 -6
  [3,16,6.57,-.25,-4.93,6.03,-.25,-5.49,8.43,-.25,-6],
// 3 16 6.03 -.25 -5.49 5.32 -.25 -5.91 8.43 -.25 -6
  [3,16,6.03,-.25,-5.49,5.32,-.25,-5.91,8.43,-.25,-6],
// 4 16 8.43 -.25 -6 5.32 -.25 -5.91 4.46 -.25 -6.18 6.9 -.25 -16.4
  [4,16,8.43,-.25,-6,5.32,-.25,-5.91,4.46,-.25,-6.18,6.9,-.25,-16.4],
// 4 16 11.67 -.25 -6 8.43 -.25 -6 6.9 -.25 -16.4 16.4 -.25 -6.9
  [4,16,11.67,-.25,-6,8.43,-.25,-6,6.9,-.25,-16.4,16.4,-.25,-6.9],
// 3 16 4.46 -.25 -6.18 3.47 -.25 -6.26 6.9 -.25 -16.4
  [3,16,4.46,-.25,-6.18,3.47,-.25,-6.26,6.9,-.25,-16.4],
// 3 16 2.52 -.25 -6.19 6.9 -.25 -16.4 3.47 -.25 -6.26
  [3,16,2.52,-.25,-6.19,6.9,-.25,-16.4,3.47,-.25,-6.26],
// 3 16 1.66 -.25 -5.95 6.9 -.25 -16.4 2.52 -.25 -6.19
  [3,16,1.66,-.25,-5.95,6.9,-.25,-16.4,2.52,-.25,-6.19],
// 4 16 6.9 -.25 -16.4 1.66 -.25 -5.95 .94 -.25 -5.53 -2.36 -.25 -6
  [4,16,6.9,-.25,-16.4,1.66,-.25,-5.95,.94,-.25,-5.53,-2.36,-.25,-6],
// 3 16 .37 -.25 -4.96 -2.36 -.25 -6 .94 -.25 -5.53
  [3,16,.37,-.25,-4.96,-2.36,-.25,-6,.94,-.25,-5.53],
// 3 16 -.01 -.25 -4.27 -2.36 -.25 -6 .37 -.25 -4.96
  [3,16,-.01,-.25,-4.27,-2.36,-.25,-6,.37,-.25,-4.96],
// 3 16 -.19 -.25 -3.53 -2.36 -.25 -6 -.01 -.25 -4.27
  [3,16,-.19,-.25,-3.53,-2.36,-.25,-6,-.01,-.25,-4.27],
// 3 16 -.23 -.25 -2.41 -2.36 -.25 -6 -.19 -.25 -3.53
  [3,16,-.23,-.25,-2.41,-2.36,-.25,-6,-.19,-.25,-3.53],
// 3 16 -.28 -.25 -.82 -2.36 -.25 -6 -.23 -.25 -2.41
  [3,16,-.28,-.25,-.82,-2.36,-.25,-6,-.23,-.25,-2.41],
// 4 16 -2.36 -.25 -6 -.28 -.25 -.82 -.28 -.25 1.31 -2.36 -.25 3.99
  [4,16,-2.36,-.25,-6,-.28,-.25,-.82,-.28,-.25,1.31,-2.36,-.25,3.99],
// 4 16 -.28 -.25 1.31 -.19 -.25 3.97 -.42 -.25 3.99 -2.36 -.25 3.99
  [4,16,-.28,-.25,1.31,-.19,-.25,3.97,-.42,-.25,3.99,-2.36,-.25,3.99],
// 4 16 -.42 -.25 3.99 -.19 -.25 3.97 -.01 -.25 4.71 -.42 -.25 6.47
  [4,16,-.42,-.25,3.99,-.19,-.25,3.97,-.01,-.25,4.71,-.42,-.25,6.47],
// 3 16 -.42 -.25 6.47 -.01 -.25 4.71 .35 -.25 5.4
  [3,16,-.42,-.25,6.47,-.01,-.25,4.71,.35,-.25,5.4],
// 3 16 -.42 -.25 6.47 .35 -.25 5.4 .91 -.25 5.97
  [3,16,-.42,-.25,6.47,.35,-.25,5.4,.91,-.25,5.97],
// 3 16 -.42 -.25 6.47 .91 -.25 5.97 1.62 -.25 6.38
  [3,16,-.42,-.25,6.47,.91,-.25,5.97,1.62,-.25,6.38],
// 4 16 -6.9 -.25 -16.4 6.9 -.25 -16.4 -2.36 -.25 -6 -5.6 -.25 -6
  [4,16,-6.9,-.25,-16.4,6.9,-.25,-16.4,-2.36,-.25,-6,-5.6,-.25,-6],
// 4 16 -6.9 -.25 -16.4 -5.6 -.25 -6 -9.23 -.25 -5.84 -10.2 -.25 -6.16
  [4,16,-6.9,-.25,-16.4,-5.6,-.25,-6,-9.23,-.25,-5.84,-10.2,-.25,-6.16],
// 3 16 -10.2 -.25 -6.16 -11.31 -.25 -6.26 -6.9 -.25 -16.4
  [3,16,-10.2,-.25,-6.16,-11.31,-.25,-6.26,-6.9,-.25,-16.4],
// 3 16 -8.48 -.25 -5.36 -9.23 -.25 -5.84 -5.6 -.25 -6
  [3,16,-8.48,-.25,-5.36,-9.23,-.25,-5.84,-5.6,-.25,-6],
// 3 16 -8.03 -.25 -4.78 -8.48 -.25 -5.36 -5.6 -.25 -6
  [3,16,-8.03,-.25,-4.78,-8.48,-.25,-5.36,-5.6,-.25,-6],
// 3 16 -7.79 -.25 -3.97 -8.03 -.25 -4.78 -5.6 -.25 -6
  [3,16,-7.79,-.25,-3.97,-8.03,-.25,-4.78,-5.6,-.25,-6],
// 3 16 -7.71 -.25 -2.81 -7.79 -.25 -3.97 -5.6 -.25 -6
  [3,16,-7.71,-.25,-2.81,-7.79,-.25,-3.97,-5.6,-.25,-6],
// 3 16 -8.05 -.25 4.46 -7.98 -.25 3.19 -7.52 -.25 3.99
  [3,16,-8.05,-.25,4.46,-7.98,-.25,3.19,-7.52,-.25,3.99],
// 3 16 -7.52 -.25 3.99 -7.98 -.25 3.19 -7.98 -.25 2.7
  [3,16,-7.52,-.25,3.99,-7.98,-.25,3.19,-7.98,-.25,2.7],
// 3 16 -7.52 -.25 3.99 -7.85 -.25 -1.23 -7.71 -.25 -2.81
  [3,16,-7.52,-.25,3.99,-7.85,-.25,-1.23,-7.71,-.25,-2.81],
// 3 16 6.9 -.25 16.4 8.43 -.25 6.47 11.69 -.25 6.47
  [3,16,6.9,-.25,16.4,8.43,-.25,6.47,11.69,-.25,6.47],
// 3 16 16.4 -.25 6.9 15.42 -.25 2.98 15.42 -.25 1.89
  [3,16,16.4,-.25,6.9,15.42,-.25,2.98,15.42,-.25,1.89],
];
module ldraw_lib__4222889c(step=0, col=false, unit=2/5, alt=false, line=0.2, solid=!$preview)
    makepoly(ldraw_lib__4222889c(), step=step, col=col, unit=unit, alt=alt, line=line, solid=solid);
ldraw_lib__4222889c(line=0.2);
